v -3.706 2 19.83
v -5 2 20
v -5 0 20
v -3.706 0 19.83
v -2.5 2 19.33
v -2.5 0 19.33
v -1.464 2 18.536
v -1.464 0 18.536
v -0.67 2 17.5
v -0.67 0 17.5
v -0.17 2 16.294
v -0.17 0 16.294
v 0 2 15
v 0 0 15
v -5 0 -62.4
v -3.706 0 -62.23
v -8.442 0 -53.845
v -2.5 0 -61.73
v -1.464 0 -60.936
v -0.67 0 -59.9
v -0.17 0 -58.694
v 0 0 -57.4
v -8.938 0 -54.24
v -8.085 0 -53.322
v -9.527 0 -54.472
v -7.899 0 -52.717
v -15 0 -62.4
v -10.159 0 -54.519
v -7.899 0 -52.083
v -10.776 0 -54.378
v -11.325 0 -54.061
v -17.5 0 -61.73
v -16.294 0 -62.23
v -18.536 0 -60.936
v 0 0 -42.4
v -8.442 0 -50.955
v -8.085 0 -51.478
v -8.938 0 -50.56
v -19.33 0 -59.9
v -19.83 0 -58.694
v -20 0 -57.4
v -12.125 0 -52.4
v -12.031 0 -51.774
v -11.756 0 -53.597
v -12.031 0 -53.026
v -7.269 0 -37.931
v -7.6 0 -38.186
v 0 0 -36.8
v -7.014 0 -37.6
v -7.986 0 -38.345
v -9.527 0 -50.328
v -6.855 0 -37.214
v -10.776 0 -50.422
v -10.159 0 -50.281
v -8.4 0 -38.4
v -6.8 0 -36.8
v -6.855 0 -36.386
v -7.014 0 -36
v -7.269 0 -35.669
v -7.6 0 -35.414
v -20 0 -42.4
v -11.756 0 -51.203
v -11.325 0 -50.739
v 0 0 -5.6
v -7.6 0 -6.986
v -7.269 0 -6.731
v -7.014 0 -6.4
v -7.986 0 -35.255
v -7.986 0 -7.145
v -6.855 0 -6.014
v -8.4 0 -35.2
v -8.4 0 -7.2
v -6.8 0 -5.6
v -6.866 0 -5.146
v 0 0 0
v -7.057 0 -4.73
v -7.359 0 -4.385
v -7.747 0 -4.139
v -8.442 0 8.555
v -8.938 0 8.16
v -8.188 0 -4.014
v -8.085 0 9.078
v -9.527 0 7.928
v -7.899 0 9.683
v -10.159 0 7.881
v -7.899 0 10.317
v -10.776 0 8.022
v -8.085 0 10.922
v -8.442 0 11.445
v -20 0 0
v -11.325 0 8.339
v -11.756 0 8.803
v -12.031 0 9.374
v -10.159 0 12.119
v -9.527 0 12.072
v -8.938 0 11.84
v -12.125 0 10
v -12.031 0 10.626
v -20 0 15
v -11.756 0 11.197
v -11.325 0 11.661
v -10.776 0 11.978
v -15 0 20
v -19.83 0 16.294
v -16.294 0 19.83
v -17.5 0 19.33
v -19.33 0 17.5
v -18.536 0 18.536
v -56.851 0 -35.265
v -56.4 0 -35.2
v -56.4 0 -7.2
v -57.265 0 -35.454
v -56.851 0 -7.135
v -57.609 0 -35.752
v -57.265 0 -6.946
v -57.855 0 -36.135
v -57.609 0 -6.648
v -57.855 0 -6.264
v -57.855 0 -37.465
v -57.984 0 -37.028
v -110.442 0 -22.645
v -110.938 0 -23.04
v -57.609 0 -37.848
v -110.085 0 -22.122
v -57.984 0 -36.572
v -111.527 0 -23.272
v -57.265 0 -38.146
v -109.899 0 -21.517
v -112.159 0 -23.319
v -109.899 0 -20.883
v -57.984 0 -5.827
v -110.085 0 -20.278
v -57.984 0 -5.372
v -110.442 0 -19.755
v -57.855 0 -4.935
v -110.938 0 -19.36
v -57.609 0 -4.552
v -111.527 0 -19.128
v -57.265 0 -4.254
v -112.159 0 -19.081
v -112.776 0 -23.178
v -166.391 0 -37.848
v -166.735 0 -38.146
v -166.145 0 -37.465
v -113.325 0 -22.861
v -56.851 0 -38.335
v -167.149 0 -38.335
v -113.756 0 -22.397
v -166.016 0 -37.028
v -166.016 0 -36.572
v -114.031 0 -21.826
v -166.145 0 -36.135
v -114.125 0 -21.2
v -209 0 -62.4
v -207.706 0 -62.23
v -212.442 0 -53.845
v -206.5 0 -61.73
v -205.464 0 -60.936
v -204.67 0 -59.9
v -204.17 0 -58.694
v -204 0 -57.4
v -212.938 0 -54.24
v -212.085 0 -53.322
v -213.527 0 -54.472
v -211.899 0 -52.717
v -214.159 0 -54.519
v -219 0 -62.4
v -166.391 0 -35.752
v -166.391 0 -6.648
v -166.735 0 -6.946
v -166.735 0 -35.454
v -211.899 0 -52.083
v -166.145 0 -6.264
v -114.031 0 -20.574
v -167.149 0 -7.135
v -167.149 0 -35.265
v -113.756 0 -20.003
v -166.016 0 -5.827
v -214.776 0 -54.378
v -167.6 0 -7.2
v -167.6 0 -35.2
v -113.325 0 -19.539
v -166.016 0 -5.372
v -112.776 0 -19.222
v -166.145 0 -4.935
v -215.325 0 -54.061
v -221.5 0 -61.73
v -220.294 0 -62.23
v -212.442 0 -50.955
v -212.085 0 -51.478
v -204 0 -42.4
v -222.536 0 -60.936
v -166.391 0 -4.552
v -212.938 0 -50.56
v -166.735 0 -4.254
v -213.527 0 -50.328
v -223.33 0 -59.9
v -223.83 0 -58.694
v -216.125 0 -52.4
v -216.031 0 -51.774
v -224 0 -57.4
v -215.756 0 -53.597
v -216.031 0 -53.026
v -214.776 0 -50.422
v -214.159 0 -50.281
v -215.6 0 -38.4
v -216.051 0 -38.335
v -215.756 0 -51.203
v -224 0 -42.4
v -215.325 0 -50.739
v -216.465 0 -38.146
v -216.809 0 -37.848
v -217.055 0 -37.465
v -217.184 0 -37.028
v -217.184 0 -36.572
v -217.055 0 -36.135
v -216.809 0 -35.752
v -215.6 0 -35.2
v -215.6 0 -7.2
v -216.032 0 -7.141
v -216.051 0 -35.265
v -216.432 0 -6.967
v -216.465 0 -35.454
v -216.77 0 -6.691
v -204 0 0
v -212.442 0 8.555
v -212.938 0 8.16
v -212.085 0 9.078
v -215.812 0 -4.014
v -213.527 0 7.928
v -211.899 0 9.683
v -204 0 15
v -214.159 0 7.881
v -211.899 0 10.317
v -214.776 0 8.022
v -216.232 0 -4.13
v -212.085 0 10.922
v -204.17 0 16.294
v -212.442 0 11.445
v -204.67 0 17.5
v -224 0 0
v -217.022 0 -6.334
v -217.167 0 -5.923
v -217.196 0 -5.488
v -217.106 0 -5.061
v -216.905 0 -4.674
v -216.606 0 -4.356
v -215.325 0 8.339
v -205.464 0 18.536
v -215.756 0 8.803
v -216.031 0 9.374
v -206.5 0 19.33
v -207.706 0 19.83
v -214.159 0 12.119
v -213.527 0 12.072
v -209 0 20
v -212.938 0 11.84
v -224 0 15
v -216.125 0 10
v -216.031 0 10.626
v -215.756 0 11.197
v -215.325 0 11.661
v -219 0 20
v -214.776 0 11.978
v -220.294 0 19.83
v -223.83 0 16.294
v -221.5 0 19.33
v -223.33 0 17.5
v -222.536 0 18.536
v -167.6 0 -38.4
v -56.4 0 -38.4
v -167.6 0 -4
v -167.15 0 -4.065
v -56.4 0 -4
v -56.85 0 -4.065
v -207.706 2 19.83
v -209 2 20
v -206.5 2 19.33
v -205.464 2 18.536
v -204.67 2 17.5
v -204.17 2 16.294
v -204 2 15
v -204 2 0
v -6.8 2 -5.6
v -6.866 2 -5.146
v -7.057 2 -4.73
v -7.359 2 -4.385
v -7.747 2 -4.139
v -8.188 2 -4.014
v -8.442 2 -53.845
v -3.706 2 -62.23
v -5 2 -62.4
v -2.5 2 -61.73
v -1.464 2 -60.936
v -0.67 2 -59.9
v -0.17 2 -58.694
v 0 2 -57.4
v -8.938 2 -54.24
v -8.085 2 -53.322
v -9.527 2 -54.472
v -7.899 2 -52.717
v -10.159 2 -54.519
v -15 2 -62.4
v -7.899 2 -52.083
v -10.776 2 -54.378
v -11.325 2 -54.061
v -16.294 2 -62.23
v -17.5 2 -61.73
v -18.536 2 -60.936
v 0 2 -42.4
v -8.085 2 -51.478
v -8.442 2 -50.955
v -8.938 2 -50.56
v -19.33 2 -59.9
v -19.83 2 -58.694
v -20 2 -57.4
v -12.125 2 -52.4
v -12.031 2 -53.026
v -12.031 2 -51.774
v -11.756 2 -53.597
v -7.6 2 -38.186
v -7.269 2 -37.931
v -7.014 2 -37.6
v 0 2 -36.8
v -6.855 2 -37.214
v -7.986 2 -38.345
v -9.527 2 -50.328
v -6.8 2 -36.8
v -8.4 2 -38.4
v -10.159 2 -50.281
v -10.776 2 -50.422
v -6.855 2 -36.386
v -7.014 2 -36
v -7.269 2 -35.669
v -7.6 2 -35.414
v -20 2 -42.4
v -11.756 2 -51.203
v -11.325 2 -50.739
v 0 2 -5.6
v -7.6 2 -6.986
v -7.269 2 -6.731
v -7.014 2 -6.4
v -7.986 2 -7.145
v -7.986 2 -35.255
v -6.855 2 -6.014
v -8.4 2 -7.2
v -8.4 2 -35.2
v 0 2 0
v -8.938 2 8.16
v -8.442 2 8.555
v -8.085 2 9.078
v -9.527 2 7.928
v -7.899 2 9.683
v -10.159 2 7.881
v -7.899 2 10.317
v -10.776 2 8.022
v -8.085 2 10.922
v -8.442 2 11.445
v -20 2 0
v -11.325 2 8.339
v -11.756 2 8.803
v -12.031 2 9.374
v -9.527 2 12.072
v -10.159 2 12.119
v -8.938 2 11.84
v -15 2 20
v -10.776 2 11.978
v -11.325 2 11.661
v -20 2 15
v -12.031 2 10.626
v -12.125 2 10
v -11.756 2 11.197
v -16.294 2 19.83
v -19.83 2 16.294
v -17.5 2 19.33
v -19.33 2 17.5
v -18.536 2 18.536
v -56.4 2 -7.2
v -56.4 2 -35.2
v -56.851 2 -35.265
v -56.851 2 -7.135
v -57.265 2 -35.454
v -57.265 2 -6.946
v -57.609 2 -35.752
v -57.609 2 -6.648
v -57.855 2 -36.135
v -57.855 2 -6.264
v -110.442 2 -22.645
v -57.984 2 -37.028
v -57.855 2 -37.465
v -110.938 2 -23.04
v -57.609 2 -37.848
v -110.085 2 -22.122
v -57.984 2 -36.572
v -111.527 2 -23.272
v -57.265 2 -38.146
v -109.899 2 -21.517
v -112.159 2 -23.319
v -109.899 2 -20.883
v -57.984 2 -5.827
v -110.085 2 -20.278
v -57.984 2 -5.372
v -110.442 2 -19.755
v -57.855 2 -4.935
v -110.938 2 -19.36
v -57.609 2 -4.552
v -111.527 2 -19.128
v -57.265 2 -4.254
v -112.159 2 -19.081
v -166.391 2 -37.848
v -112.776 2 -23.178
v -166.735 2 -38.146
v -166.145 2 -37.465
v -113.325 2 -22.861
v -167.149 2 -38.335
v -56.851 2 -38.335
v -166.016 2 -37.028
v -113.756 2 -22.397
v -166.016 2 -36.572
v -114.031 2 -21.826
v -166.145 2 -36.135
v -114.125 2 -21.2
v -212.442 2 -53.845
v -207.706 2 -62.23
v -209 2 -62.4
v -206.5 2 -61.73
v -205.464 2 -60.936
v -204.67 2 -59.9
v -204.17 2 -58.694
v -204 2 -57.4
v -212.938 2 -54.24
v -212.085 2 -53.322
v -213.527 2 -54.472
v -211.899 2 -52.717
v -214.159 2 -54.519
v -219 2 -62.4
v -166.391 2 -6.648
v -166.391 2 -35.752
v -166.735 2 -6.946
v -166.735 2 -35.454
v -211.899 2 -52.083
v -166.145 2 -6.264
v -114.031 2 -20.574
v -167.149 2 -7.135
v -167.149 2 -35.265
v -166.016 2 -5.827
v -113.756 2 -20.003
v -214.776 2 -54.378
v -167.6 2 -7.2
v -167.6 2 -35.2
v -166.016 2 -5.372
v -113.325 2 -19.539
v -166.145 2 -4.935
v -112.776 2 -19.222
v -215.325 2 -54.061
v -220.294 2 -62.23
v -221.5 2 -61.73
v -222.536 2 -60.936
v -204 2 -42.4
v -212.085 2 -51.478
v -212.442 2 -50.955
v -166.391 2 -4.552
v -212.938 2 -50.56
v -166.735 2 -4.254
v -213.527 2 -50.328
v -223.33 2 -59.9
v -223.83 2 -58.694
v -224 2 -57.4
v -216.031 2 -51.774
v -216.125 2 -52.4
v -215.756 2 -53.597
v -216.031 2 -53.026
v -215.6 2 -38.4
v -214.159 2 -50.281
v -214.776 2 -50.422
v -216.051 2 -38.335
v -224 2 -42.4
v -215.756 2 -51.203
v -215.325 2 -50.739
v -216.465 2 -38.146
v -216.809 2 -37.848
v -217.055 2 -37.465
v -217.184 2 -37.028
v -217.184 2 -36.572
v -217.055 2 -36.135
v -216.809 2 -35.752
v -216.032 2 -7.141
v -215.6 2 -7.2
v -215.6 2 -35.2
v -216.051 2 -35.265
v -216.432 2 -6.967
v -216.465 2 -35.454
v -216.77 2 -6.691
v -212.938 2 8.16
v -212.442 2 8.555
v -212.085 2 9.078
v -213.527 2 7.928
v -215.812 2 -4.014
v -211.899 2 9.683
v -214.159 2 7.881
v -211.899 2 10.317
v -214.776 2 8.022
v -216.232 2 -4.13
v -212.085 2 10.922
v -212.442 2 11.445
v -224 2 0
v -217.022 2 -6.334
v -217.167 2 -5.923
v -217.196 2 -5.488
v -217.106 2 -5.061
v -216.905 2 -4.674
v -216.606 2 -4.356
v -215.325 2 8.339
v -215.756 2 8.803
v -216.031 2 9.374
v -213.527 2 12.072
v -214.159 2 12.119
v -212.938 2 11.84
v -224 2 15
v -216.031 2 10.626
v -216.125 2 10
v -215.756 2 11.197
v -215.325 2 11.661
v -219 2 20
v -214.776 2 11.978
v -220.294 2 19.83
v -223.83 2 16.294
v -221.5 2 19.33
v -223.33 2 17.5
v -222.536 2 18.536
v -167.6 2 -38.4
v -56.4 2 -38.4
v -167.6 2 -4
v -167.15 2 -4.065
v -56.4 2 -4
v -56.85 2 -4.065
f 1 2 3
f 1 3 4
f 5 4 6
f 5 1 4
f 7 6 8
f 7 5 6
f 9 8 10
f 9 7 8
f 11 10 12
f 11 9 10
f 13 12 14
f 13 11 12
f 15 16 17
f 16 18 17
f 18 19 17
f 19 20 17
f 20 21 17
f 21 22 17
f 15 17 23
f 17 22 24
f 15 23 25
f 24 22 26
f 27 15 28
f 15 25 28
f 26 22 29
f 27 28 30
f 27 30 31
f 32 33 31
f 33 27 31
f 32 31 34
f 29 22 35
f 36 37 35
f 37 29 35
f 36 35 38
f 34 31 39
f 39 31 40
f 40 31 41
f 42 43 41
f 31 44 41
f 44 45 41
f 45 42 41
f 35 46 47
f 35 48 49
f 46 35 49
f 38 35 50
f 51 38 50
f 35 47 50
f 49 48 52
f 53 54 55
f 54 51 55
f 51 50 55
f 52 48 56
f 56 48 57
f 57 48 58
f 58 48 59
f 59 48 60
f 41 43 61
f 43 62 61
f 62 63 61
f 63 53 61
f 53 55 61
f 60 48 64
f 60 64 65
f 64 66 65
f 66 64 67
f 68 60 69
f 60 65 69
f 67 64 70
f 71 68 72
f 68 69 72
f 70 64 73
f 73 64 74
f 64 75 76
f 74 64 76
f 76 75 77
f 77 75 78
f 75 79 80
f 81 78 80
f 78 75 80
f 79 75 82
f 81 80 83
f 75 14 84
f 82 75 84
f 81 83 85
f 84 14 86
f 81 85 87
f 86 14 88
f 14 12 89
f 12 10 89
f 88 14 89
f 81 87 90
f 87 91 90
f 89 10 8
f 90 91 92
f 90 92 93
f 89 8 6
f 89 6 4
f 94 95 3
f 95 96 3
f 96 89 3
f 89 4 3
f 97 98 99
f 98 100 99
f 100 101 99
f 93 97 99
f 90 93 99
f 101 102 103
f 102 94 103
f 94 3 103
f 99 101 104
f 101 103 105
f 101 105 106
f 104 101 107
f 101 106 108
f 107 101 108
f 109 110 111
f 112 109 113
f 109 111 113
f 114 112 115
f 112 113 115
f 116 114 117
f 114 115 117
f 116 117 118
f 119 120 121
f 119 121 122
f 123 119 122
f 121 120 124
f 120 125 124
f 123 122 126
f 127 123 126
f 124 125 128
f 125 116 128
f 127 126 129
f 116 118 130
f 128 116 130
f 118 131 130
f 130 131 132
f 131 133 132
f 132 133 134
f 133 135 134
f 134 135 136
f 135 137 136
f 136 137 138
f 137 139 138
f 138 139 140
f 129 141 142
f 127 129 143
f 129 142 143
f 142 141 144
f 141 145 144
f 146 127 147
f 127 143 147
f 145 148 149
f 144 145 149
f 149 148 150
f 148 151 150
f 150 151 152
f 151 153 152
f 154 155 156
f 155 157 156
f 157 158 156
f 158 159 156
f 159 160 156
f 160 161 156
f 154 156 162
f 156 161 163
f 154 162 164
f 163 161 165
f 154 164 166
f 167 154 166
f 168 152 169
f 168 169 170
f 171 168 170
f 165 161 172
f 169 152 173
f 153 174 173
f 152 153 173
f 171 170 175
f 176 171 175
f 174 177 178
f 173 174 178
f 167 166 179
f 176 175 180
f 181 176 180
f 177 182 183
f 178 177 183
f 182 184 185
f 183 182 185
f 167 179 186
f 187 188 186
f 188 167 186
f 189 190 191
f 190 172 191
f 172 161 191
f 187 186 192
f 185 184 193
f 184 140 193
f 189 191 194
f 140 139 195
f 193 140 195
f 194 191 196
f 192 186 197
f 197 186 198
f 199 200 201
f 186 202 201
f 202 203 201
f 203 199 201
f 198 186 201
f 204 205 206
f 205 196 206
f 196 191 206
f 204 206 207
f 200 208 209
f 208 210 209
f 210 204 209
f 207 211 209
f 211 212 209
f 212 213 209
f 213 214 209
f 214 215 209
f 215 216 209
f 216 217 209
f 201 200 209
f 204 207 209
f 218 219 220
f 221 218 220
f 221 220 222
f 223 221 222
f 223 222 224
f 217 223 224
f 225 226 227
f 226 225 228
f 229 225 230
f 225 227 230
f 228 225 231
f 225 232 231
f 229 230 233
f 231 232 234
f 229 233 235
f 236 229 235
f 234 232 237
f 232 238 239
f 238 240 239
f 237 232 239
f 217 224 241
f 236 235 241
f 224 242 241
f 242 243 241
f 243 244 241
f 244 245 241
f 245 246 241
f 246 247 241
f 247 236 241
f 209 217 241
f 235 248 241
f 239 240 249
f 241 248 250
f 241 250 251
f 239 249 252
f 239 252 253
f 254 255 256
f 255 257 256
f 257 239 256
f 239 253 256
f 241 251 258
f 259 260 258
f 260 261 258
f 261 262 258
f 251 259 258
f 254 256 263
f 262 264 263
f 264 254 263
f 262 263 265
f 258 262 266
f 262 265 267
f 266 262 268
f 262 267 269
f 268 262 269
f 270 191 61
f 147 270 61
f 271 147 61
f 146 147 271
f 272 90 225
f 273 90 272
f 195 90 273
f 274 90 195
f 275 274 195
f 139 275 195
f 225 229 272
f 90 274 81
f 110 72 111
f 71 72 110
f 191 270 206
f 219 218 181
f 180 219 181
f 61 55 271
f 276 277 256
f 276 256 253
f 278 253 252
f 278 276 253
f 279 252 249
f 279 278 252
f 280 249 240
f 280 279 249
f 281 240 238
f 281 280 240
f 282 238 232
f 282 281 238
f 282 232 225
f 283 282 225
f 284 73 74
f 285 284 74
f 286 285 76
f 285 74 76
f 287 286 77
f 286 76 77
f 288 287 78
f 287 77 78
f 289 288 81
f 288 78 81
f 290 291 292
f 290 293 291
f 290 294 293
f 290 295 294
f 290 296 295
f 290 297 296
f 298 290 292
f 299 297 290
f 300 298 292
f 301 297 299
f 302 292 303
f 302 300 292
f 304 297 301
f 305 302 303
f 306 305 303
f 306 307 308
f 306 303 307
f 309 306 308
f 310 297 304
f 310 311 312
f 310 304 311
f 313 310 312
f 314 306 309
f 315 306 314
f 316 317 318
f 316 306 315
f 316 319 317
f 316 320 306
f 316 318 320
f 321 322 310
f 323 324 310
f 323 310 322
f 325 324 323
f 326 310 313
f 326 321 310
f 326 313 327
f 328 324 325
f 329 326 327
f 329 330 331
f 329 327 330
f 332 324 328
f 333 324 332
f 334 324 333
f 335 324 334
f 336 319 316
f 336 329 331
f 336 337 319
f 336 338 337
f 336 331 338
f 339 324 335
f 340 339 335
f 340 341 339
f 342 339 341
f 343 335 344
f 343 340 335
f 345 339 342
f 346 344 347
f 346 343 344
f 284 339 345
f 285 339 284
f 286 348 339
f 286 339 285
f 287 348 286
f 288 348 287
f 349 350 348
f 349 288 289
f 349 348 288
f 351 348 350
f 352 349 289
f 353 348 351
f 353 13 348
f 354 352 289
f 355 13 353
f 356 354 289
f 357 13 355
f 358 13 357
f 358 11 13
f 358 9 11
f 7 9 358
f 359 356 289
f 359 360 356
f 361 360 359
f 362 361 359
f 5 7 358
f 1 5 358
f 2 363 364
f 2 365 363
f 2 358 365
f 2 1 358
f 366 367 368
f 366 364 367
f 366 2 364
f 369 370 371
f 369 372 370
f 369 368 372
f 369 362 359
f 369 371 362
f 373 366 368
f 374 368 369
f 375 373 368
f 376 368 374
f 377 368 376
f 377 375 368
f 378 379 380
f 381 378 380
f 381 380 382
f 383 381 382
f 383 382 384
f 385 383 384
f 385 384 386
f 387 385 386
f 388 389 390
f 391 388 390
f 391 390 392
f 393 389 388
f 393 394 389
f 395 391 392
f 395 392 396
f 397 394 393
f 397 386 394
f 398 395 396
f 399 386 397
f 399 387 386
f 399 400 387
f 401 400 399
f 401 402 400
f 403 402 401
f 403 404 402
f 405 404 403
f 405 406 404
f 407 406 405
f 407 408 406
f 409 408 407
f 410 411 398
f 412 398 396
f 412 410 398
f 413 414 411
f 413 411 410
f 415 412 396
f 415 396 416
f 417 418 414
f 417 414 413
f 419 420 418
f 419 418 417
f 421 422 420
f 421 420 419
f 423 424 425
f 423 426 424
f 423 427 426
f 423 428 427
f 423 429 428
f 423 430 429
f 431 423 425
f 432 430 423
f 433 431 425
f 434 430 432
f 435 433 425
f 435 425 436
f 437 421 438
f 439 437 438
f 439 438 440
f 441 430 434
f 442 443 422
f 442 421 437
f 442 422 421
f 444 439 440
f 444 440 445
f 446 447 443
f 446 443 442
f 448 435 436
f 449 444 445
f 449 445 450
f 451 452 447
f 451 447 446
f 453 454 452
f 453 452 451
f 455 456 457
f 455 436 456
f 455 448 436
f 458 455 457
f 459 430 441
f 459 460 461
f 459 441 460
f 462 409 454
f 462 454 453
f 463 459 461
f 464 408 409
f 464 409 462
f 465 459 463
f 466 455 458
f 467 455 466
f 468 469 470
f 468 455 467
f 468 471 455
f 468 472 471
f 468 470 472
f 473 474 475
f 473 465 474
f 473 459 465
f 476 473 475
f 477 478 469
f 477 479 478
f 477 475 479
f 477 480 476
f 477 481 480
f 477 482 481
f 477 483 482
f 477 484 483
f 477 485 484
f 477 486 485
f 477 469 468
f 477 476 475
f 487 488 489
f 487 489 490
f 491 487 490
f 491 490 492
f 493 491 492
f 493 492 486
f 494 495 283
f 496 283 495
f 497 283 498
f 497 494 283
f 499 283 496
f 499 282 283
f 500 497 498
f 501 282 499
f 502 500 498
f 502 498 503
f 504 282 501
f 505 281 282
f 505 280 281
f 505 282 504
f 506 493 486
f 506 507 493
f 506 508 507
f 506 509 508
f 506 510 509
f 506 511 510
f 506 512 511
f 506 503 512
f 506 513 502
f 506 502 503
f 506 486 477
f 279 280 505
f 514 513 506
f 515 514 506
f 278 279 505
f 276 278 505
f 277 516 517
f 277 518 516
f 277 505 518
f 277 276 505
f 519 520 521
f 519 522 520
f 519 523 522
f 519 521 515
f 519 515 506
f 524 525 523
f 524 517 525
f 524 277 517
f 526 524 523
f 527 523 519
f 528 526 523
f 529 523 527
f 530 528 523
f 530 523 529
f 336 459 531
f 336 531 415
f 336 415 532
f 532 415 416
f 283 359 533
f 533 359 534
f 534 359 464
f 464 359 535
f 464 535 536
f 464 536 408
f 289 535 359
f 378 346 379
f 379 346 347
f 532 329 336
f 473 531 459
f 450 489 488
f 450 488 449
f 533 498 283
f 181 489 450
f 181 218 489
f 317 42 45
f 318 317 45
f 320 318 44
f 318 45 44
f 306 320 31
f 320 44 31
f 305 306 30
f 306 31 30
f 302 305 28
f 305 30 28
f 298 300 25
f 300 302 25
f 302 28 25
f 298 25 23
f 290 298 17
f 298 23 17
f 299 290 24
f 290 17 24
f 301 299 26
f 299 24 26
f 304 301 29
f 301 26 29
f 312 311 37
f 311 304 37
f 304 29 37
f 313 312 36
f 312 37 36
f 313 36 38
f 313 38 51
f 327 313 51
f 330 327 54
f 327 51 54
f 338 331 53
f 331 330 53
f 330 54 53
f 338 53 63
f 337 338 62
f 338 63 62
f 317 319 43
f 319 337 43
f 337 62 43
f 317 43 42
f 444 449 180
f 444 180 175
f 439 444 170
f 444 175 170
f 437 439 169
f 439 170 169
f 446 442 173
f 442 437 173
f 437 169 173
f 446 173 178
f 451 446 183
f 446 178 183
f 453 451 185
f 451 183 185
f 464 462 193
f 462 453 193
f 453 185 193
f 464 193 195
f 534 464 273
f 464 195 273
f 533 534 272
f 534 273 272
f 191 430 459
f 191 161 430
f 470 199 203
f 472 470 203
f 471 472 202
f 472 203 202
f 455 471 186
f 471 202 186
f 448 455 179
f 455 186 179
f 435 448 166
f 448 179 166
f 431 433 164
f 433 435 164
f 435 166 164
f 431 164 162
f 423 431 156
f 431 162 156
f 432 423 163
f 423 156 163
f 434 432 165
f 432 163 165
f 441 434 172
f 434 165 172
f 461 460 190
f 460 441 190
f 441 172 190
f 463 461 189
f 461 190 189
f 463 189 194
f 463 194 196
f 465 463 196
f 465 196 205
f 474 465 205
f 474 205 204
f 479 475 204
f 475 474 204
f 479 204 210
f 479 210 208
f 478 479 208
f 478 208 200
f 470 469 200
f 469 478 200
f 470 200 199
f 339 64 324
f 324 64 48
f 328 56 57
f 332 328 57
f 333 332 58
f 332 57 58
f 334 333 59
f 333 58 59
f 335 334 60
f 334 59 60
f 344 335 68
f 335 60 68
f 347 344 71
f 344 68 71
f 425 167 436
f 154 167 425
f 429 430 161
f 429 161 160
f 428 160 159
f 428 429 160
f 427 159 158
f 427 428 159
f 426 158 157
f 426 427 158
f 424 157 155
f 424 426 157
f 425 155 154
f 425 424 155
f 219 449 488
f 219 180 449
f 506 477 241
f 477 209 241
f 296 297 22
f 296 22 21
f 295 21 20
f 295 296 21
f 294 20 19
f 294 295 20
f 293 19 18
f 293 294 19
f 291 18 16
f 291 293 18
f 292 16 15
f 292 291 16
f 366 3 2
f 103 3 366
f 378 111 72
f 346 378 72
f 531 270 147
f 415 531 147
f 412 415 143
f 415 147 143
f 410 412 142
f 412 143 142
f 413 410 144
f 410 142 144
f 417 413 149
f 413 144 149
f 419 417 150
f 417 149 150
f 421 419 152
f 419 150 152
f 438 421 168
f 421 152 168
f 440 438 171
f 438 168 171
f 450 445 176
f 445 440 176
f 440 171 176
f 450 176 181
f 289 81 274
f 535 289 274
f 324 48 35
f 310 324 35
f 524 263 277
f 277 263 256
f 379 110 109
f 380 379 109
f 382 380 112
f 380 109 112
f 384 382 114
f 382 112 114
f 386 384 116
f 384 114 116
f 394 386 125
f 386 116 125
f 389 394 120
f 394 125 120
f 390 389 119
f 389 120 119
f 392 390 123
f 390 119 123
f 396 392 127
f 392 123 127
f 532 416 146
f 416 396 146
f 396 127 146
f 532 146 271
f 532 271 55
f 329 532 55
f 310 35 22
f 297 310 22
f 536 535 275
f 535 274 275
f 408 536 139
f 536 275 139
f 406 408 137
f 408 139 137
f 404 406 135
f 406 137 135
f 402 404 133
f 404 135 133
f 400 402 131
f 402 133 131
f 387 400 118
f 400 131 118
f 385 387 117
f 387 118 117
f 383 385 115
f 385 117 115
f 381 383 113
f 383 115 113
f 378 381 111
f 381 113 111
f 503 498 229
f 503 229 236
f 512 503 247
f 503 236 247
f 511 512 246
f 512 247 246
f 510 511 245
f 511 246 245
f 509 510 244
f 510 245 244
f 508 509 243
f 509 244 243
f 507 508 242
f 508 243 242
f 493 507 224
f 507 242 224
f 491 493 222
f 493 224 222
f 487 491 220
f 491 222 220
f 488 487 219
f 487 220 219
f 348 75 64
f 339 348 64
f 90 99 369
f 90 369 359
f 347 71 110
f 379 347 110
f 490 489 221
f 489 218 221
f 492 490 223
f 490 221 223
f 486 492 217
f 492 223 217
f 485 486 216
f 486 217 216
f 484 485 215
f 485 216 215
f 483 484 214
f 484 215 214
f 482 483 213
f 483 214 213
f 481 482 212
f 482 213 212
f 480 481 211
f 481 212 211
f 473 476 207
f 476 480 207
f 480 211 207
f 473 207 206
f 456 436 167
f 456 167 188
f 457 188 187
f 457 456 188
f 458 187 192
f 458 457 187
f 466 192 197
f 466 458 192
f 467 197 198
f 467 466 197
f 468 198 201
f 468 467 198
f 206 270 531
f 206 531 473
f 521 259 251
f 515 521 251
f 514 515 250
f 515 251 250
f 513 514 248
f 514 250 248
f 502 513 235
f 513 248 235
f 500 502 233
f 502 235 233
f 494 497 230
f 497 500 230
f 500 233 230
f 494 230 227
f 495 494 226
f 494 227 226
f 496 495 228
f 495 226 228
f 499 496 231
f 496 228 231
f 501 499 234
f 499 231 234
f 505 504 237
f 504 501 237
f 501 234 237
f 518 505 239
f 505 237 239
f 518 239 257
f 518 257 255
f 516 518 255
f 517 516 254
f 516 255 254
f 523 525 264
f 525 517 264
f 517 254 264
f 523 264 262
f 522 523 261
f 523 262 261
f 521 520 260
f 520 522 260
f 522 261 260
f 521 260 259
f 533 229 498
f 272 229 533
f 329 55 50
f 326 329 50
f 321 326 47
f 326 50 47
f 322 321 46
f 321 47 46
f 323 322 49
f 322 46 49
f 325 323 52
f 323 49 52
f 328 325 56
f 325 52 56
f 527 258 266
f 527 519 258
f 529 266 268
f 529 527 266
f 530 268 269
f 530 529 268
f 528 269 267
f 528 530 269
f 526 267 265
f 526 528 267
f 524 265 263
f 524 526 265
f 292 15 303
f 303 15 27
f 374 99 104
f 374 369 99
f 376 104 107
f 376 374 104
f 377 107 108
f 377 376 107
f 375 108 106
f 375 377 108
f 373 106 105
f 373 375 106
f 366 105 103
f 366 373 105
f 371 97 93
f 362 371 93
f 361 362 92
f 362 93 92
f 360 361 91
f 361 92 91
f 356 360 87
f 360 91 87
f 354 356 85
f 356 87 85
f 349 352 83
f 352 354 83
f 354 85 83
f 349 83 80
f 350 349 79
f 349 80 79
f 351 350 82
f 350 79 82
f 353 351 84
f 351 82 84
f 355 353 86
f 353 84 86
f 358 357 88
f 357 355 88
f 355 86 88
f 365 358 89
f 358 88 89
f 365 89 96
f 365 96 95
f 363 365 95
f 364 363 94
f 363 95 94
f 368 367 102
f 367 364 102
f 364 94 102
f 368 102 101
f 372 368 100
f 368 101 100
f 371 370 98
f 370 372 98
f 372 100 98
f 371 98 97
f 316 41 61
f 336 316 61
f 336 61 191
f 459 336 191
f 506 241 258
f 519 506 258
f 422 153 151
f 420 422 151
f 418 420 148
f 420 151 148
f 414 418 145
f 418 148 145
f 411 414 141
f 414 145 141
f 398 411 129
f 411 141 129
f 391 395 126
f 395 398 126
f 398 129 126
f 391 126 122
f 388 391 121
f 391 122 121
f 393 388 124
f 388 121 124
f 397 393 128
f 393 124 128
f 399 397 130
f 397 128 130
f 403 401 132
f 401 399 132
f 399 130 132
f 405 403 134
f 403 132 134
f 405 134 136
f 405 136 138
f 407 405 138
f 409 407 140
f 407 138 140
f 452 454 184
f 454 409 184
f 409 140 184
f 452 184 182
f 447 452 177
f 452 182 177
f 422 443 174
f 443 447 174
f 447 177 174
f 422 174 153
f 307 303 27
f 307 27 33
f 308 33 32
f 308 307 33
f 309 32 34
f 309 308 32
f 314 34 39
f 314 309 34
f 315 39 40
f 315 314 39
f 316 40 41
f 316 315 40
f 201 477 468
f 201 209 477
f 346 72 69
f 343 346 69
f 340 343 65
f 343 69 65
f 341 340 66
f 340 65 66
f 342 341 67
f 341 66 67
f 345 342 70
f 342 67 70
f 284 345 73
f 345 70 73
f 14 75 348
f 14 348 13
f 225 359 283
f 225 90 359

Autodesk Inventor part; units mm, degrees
ref_plane "YZ Plane" through (0, 0, 0) normal (1, 0, 0) x (0, 1, 0)
ref_plane "XZ Plane" through (0, 0, 0) normal (0, 1, 0) x (-1, 0, 0)
ref_plane "XY Plane" through (0, 0, 0) normal (0, 0, 1) x (1, 0, 0)
sketch "Sketch1" plane through (0, 0, 0) normal (0, 1, 0) x (-1, 0, 0)
  line L0 (0, 0) -> (0, -42.4)
  line L1 (20, 0) -> (204, 0)
  line L2 (20, -42.4) -> (204, -42.4)
  line L3 (224, -42.4) -> (224, 0)
  line L4 (0, -42.4) -> (0, -62.4)
  line L5 (0, -62.4) -> (20, -62.4)
  line L6 (20, -62.4) -> (20, -42.4)
  line L7 (0, 0) -> (0, 20)
  line L8 (0, 20) -> (20, 20)
  line L9 (20, 20) -> (20, 0)
  line L10 (224, -42.4) -> (224, -62.4)
  line L11 (224, -62.4) -> (204, -62.4)
  line L12 (204, -62.4) -> (204, -42.4)
  line L13 (224, 0) -> (224, 20)
  line L14 (224, 20) -> (204, 20)
  line L15 (204, 20) -> (204, 0)
  circle A0 centre (10, -52.4) radius 2.125
  circle A1 centre (10, 10) radius 2.125
  circle A2 centre (214, -52.4) radius 2.125
  circle A3 centre (214, 10) radius 2.125
  circle A4 centre (112, -21.2) radius 2.125
  line L16 (0, -42.4) -> (0, -36.8)
  line L17 (0, -36.8) -> (8.4, -36.8)
  arc A5 (8.4, -35.2) -> (8.4, -38.4) centre (8.4, -36.8) ccw
  line L18 (0, 0) -> (0, -5.6)
  line L19 (0, -5.6) -> (8.4, -5.6)
  arc A6 (8.1881, -4.0141) -> (8.4, -7.2) centre (8.4, -5.6) ccw
  arc A7 (56.4, -38.4) -> (56.4, -35.2) centre (56.4, -36.8) ccw
  line L20 (8.4, -35.2) -> (56.4, -35.2)
  line L21 (56.4, -38.4) -> (8.4, -38.4)
  arc A8 (56.4, -7.2) -> (56.3995, -4) centre (56.4, -5.6) ccw
  line L22 (56.4, -7.2) -> (8.4, -7.2)
  line L23 (8.1881, -4.0141) -> (56.3995, -4)
  arc A9 (215.6, -38.4) -> (215.6, -35.2) centre (215.6, -36.8) ccw
  arc A10 (215.6, -7.2) -> (215.8119, -4.0141) centre (215.6, -5.6) ccw
  arc A11 (167.6, -35.2) -> (167.6, -38.4) centre (167.6, -36.8) ccw
  line L24 (215.6, -35.2) -> (167.6, -35.2)
  line L25 (167.6, -38.4) -> (215.6, -38.4)
  arc A12 (167.6005, -4) -> (167.6, -7.2) centre (167.6, -5.6) ccw
  line L26 (167.6, -7.2) -> (215.6, -7.2)
  line L27 (215.8119, -4.0141) -> (167.6005, -4)
  dimension "d1" = 42.4
  dimension "d2" = 224
  dimension "d3" = 224
  dimension "d4" = 20
  dimension "d5" = 20
  dimension "d6" = 20
  dimension "d7" = 20
  dimension "d8" = 20
  dimension "d9" = 20
  dimension "d10" = 4.25
  dimension "d11" = 4.25
  dimension "d12" = 4.25
  dimension "d13" = 4.25
  dimension "d14" = 4.25
  dimension "d15" = 5.6
  dimension "d16" = 8.4
  dimension "d17" = 3.2
  dimension "d18" = 5.6
  dimension "d19" = 3.2
  dimension "d23" = 3.2
  dimension "d28" = 3.2
extrude "Extrusion1" add sketch "Sketch1" along normal blind 2
fillet "Fillet1" radius 5 8 edges at (0, 1, 20) (-20, 1, 20) (0, 1, -62.4) (-20, 1, -62.4) (-204, 1, -62.4) (-224, 1, -62.4) (-204, 1, 20) (-224, 1, 20)
properties part number "Motor Attachment 3.0"
